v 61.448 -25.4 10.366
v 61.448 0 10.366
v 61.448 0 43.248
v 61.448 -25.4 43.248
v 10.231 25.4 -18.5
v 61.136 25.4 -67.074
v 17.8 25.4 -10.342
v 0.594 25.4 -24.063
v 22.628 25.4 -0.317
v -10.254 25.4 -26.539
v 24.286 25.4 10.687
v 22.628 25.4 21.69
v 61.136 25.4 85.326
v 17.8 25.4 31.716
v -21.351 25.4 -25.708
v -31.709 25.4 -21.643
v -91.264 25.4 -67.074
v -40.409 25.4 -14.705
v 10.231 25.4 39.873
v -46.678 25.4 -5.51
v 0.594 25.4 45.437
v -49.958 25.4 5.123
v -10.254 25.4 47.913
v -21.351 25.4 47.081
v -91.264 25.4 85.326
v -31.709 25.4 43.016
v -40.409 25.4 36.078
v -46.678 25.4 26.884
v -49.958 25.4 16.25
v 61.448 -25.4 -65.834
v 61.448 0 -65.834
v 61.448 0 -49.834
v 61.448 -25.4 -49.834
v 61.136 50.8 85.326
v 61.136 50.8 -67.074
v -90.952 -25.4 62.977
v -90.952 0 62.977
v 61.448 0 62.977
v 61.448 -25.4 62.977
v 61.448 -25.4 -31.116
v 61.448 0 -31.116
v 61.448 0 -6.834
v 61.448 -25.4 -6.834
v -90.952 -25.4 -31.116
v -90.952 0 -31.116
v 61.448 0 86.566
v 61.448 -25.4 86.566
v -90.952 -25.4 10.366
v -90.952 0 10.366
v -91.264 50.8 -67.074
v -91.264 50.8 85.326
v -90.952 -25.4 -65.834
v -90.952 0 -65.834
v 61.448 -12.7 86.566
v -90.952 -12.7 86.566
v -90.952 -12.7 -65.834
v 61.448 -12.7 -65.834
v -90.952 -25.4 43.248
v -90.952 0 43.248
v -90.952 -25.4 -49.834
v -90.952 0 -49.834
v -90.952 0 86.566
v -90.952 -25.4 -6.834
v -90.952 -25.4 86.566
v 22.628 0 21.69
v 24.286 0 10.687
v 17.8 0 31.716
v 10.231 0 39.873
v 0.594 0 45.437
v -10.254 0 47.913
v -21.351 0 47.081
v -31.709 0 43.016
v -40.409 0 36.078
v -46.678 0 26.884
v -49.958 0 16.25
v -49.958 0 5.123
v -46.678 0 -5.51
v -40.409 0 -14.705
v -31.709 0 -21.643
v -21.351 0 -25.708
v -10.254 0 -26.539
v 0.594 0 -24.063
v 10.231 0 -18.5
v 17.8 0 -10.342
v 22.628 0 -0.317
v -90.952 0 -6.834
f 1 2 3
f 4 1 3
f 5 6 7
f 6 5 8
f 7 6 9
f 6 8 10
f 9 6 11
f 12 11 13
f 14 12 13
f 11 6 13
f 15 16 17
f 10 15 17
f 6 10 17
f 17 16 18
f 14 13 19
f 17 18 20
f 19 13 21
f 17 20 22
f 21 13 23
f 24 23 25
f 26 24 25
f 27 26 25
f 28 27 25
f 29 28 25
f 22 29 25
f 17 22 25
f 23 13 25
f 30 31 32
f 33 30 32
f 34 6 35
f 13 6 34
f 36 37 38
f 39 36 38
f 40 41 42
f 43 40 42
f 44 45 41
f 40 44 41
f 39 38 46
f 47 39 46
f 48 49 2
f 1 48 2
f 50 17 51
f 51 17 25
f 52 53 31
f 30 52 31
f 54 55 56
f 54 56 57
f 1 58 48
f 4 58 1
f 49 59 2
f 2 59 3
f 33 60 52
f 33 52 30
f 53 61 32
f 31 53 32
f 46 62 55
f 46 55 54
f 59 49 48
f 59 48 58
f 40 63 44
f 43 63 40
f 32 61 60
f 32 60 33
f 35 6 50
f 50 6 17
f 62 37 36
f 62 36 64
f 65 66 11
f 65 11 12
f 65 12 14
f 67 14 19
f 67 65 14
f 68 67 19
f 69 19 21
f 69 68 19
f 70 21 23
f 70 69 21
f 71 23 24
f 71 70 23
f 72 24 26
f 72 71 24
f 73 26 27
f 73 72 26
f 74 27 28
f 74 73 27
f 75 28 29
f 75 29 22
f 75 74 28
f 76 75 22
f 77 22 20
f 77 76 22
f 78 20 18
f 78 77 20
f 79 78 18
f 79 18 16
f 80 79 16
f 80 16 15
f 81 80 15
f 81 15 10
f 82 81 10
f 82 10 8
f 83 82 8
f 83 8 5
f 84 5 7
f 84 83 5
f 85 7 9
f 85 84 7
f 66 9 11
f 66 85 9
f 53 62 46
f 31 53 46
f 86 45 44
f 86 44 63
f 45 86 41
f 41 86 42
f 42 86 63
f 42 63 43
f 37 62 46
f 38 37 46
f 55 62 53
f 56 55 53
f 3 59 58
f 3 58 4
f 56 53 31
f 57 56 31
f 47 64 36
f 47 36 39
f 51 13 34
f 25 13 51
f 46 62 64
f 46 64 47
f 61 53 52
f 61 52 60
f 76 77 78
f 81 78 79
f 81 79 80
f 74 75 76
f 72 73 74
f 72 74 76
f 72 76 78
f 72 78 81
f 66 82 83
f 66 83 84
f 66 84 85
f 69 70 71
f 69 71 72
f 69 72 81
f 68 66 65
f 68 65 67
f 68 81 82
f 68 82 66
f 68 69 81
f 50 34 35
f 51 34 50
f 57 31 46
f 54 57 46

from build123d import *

# Parameters (mm, degrees)
F0_W     = 152.4
F0_H     = 23.5887402564
F1_DEPTH = 25.4
F0_H_2   = 16.0005772382
F0_H_3   = 32.8820366412
F0_H_4   = 24.2821210995
F0_H_5   = 19.7292231023
F0_H_6   = 17.19983574
F0_H_7   = 18.7174659222
F2_DEPTH = 12.7
F3_R     = 37.3304487393
F4_DEPTH = 25.4
F5_W     = 152.4
F5_H     = 152.4
F6_DEPTH = 25.4


with BuildPart() as f1:
    # F0 (on Front) → F1 (new body)
    with BuildSketch(Plane.XZ):
        with Locations((-14.7518922557, 74.7714010015)):
            Rectangle(F0_W, F0_H)
    extrude(amount=F1_DEPTH)


with BuildPart() as f1b:
    # F0 (on Front) → F1, piece 2 (new body)
    with BuildSketch(Plane.XZ):
        with Locations((-14.7518922557, -57.8339402512)):
            Rectangle(F0_W, F0_H_2)
    extrude(amount=F1_DEPTH)


with BuildPart() as f1c:
    # F0 (on Front) → F1, piece 3 (new body)
    with BuildSketch(Plane.XZ):
        with Locations((-14.7518922557, 26.8067894503)):
            Rectangle(F0_W, F0_H_3)
    extrude(amount=F1_DEPTH)


with BuildPart() as f1d:
    # F0 (on Front) → F1, piece 4 (new body)
    with BuildSketch(Plane.XZ):
        with Locations((-14.7518922557, -18.9751251601)):
            Rectangle(F0_W, F0_H_4)
    extrude(amount=F1_DEPTH)


with BuildPart() as f2:
    # F0 (on Front) → F2 (new body)
    with BuildSketch(Plane.XZ):
        with Locations((-14.7518922557, 74.7714010015)):
            Rectangle(F0_W, F0_H)
        with Locations((-14.7518922557, 53.1124193221)):
            Rectangle(F0_W, F0_H_5)
        with Locations((-14.7518922557, 26.8067894503)):
            Rectangle(F0_W, F0_H_3)
        with Locations((-14.7518922557, 1.7658532597)):
            Rectangle(F0_W, F0_H_6)
        with Locations((-14.7518922557, -18.9751251601)):
            Rectangle(F0_W, F0_H_4)
        with Locations((-14.7518922557, -40.474918671)):
            Rectangle(F0_W, F0_H_7)
        with Locations((-14.7518922557, -57.8339402512)):
            Rectangle(F0_W, F0_H_2)
    extrude(amount=F2_DEPTH)


with BuildPart() as f4:
    # F3 (on Front) → F4 (new body)
    with BuildSketch(Plane.XZ):
        with Locations((-13.0440173671, 10.6865931302)):
            Circle(F3_R)
    extrude(amount=-F4_DEPTH)

    # F5 (on face) → F6 (join)
    with BuildSketch(Plane(origin=(0, 25.4, 0), x_dir=(-1, 0, 0), z_dir=(0, 1, 0))):
        with Locations((15.0637961924, 9.1263204205)):
            Rectangle(F5_W, F5_H)
    extrude(amount=F6_DEPTH)


solid = Compound([f1.part, f1b.part, f1c.part, f1d.part, f2.part, f4.part])
